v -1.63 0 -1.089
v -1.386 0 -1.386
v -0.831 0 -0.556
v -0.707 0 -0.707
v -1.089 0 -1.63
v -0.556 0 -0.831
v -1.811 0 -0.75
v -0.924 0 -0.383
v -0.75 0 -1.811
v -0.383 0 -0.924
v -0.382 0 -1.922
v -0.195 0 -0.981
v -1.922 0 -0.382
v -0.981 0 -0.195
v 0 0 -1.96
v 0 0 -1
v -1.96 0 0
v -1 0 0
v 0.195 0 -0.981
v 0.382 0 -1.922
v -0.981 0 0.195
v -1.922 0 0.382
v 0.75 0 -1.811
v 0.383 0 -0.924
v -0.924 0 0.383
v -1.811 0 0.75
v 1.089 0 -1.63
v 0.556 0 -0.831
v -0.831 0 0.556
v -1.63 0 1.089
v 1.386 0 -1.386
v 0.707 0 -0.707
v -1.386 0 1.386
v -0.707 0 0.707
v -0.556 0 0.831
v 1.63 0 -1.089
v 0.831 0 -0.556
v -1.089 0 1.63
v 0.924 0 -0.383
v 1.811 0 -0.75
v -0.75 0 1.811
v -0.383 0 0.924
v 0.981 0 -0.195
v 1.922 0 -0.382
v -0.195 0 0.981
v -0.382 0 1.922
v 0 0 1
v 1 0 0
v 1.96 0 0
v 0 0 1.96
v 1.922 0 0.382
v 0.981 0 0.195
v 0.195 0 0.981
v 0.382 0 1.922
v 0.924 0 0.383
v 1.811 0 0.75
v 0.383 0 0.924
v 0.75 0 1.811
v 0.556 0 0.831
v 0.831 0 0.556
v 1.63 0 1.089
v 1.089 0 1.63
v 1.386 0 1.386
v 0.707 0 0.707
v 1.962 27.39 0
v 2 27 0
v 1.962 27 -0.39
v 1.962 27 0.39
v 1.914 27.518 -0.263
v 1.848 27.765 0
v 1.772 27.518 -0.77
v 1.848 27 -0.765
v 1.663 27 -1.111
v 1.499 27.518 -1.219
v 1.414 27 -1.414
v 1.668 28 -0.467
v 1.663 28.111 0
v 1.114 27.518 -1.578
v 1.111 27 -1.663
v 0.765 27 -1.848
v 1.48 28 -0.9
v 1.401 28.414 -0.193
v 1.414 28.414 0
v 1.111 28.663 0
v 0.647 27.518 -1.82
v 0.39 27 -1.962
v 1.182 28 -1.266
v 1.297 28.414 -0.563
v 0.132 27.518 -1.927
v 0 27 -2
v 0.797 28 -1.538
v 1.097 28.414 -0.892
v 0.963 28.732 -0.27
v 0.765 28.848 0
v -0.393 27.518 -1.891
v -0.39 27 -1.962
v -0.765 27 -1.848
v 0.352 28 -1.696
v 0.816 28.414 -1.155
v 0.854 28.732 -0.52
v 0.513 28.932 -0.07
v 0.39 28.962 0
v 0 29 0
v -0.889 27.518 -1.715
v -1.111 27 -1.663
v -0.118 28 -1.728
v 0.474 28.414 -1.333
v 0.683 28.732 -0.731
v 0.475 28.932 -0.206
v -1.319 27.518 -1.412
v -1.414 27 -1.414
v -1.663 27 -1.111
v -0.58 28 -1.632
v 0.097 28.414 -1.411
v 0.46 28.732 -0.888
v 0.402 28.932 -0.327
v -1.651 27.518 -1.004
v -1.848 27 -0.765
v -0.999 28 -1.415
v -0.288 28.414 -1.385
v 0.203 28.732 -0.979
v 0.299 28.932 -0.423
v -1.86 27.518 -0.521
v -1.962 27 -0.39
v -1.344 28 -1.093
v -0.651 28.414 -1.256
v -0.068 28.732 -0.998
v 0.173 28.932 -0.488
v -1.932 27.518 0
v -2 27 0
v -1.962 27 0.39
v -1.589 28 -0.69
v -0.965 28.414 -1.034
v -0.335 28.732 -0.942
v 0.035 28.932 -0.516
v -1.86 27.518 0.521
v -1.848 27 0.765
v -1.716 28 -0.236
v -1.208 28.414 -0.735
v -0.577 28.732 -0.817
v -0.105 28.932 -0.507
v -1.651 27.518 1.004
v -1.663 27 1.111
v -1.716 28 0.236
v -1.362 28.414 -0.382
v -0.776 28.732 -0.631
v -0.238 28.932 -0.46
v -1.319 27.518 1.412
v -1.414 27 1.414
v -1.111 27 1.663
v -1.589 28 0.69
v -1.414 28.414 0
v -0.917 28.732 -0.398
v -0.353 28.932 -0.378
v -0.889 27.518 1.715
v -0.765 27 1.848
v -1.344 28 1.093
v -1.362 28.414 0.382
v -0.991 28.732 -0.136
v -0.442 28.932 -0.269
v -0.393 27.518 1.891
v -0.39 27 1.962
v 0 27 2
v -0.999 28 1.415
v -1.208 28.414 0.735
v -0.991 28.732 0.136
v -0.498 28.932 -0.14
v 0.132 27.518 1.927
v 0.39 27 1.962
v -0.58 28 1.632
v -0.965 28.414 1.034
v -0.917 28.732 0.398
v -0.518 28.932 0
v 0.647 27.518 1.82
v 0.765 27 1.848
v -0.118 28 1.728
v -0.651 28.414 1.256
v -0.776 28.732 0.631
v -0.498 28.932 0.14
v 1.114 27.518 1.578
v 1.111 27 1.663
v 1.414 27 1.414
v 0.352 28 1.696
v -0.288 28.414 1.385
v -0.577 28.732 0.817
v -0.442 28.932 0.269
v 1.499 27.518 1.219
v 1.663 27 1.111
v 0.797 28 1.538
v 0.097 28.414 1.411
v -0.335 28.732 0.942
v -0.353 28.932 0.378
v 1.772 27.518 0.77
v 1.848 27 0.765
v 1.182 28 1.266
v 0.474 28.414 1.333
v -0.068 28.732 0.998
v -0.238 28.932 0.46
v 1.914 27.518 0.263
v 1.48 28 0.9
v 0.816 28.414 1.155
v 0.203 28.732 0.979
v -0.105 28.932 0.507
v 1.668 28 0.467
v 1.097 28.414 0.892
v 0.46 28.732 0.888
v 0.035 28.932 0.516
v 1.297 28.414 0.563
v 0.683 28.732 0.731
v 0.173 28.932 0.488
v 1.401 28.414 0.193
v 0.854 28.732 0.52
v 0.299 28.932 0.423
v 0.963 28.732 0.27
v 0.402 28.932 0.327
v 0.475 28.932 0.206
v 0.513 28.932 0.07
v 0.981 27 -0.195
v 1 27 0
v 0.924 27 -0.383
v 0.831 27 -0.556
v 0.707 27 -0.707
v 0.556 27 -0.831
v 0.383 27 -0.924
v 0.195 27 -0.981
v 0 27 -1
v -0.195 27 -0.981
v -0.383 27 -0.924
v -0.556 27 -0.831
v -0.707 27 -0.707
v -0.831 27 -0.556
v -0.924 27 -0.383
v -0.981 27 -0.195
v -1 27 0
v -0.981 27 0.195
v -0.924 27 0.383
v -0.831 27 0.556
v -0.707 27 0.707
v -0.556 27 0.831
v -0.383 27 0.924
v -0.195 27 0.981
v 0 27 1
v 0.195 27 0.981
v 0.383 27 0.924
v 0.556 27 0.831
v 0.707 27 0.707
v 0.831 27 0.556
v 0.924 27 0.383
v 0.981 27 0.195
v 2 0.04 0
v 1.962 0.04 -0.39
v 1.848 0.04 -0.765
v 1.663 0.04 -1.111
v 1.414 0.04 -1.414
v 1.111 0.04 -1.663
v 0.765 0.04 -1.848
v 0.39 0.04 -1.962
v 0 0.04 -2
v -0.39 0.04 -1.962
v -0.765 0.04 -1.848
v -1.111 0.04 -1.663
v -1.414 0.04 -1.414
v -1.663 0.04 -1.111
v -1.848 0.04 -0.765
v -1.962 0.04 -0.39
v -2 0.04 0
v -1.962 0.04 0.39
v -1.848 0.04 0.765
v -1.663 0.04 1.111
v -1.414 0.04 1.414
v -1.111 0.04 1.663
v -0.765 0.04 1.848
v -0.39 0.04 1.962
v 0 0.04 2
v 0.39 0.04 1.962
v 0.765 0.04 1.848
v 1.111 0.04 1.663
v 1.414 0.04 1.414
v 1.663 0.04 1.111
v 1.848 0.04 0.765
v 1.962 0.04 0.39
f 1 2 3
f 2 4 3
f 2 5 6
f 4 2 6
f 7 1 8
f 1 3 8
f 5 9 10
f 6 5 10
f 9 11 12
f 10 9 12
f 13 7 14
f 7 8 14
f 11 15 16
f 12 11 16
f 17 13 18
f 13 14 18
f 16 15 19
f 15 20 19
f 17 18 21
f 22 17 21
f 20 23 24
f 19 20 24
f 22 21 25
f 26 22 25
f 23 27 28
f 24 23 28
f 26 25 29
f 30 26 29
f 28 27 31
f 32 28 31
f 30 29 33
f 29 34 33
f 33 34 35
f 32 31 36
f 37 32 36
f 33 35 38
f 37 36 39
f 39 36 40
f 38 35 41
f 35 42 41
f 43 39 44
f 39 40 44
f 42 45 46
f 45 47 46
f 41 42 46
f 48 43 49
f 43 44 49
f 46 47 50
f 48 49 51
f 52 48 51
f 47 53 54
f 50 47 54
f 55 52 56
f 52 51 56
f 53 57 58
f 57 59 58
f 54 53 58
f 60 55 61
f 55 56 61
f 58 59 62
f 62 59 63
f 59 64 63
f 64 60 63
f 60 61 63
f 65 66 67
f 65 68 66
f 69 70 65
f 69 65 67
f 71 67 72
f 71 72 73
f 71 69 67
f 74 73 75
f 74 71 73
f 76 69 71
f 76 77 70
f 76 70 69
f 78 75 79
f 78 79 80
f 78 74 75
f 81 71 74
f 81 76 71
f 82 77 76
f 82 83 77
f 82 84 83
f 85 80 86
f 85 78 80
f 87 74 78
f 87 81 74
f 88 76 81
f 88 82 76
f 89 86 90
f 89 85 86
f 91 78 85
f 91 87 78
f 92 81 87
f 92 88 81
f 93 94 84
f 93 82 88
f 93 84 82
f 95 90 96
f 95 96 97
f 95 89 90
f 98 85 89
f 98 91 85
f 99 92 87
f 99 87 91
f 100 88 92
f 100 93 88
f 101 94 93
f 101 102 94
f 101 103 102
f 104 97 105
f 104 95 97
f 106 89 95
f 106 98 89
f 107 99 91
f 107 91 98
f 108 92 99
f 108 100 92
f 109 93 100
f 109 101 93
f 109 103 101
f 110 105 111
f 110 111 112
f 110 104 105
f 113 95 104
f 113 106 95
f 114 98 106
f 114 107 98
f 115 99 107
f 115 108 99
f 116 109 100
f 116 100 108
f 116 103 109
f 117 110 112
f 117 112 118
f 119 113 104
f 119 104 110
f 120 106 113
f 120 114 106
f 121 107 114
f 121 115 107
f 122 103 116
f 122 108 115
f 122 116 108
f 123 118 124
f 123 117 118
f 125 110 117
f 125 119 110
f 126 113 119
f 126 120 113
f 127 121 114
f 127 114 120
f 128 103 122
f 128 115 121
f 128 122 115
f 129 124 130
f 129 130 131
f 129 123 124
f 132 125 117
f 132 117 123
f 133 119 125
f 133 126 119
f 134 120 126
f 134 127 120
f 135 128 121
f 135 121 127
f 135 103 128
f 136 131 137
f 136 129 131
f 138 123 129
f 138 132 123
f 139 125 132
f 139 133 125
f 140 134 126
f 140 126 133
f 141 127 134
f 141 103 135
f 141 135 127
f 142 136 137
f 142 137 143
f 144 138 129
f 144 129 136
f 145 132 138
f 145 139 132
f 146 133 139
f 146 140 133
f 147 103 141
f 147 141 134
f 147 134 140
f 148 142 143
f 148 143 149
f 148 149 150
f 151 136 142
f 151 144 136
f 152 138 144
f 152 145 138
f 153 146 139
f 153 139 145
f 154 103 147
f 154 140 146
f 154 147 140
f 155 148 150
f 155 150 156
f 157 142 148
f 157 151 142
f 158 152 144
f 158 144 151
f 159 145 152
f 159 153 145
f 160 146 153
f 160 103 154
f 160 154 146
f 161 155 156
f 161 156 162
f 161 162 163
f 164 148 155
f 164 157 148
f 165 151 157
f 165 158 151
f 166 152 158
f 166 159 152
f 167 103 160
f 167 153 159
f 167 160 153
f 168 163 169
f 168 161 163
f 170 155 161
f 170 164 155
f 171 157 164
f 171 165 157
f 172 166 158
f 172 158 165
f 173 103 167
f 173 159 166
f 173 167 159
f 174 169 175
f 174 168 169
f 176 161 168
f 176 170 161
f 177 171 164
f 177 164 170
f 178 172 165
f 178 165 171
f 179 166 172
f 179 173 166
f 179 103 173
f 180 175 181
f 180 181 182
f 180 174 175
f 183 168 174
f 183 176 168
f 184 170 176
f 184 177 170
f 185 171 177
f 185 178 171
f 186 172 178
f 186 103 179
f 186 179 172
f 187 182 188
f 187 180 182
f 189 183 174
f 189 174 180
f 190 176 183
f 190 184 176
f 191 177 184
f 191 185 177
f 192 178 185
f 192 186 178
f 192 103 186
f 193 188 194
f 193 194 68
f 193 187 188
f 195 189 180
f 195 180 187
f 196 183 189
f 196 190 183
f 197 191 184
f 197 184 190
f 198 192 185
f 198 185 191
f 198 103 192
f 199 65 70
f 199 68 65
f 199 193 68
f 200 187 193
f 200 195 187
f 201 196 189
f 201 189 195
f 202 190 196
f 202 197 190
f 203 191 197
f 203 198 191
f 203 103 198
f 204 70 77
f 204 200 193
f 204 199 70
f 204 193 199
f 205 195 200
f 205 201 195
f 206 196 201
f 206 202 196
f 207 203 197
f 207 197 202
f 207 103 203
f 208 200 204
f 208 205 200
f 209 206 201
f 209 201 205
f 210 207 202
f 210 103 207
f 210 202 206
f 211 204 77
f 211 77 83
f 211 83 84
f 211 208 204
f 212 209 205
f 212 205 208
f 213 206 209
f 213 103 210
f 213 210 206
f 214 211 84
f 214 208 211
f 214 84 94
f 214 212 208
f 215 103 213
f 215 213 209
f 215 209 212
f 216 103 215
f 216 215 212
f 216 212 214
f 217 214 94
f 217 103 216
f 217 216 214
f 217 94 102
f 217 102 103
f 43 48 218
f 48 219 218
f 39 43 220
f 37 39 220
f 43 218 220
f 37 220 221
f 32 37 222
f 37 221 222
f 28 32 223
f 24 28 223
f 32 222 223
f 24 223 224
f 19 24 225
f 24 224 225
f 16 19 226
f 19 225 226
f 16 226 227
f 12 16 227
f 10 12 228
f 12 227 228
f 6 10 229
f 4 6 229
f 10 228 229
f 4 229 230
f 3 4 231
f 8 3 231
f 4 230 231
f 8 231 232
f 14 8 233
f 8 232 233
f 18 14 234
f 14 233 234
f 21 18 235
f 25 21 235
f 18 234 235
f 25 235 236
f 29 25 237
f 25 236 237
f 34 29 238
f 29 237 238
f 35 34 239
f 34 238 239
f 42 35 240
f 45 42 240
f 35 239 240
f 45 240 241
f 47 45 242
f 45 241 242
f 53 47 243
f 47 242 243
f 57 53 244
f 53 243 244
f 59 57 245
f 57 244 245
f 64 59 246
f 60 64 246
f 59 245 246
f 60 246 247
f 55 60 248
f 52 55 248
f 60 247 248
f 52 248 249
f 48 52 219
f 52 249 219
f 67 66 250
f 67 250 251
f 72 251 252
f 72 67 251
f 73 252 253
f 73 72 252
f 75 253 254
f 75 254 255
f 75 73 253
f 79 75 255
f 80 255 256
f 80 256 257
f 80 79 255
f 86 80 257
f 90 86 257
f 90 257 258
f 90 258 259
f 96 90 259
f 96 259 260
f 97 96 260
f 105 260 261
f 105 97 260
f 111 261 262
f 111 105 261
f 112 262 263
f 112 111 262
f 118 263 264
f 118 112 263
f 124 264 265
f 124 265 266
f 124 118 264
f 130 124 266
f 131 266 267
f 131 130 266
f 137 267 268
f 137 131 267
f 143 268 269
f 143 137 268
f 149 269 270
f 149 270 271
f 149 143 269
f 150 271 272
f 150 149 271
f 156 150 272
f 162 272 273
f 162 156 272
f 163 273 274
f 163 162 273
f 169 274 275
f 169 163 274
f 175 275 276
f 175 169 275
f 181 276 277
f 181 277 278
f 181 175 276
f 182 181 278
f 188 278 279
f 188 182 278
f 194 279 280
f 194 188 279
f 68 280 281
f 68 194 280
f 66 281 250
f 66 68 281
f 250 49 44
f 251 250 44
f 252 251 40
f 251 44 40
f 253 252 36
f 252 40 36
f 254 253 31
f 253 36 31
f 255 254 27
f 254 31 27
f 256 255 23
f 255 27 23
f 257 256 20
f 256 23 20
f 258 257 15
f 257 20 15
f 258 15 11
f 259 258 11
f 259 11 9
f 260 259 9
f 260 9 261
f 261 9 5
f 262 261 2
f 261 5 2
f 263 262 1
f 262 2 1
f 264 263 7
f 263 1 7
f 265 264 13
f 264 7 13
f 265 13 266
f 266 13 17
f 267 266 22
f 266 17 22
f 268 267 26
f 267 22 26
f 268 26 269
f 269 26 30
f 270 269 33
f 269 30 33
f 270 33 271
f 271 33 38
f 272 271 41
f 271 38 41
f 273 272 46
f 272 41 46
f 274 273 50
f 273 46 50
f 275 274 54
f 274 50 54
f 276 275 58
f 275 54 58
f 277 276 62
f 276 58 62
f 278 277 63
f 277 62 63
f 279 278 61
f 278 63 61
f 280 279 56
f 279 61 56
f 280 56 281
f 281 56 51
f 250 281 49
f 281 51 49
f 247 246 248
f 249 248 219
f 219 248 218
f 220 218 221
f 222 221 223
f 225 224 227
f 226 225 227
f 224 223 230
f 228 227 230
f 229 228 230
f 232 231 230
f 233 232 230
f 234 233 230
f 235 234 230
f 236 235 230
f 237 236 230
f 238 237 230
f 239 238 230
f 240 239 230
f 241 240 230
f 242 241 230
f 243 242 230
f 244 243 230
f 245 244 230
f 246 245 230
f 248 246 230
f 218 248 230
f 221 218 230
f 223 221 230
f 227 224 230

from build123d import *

# Parameters (mm, degrees)
THICKEN1_T2   = 1
CHAMFER1_SIZE = 0.04


with BuildPart() as body_1:
    # Surface-Revolve1: a surface, the sketch's curves turned about an axis
    with BuildLine(Plane.XY, mode=Mode.PRIVATE) as surface_revolve1_1_path:
        Line((2, 0), (2, 27))
        ThreePointArc((2, 27), (1.414213562, 28.414213562), (0, 29))
    surface_revolve1_1 = Shell.revolve(surface_revolve1_1_path.wire(), 360, Axis((0, 0, 0), (0, 1, 0)))
    add(Solid.thicken(surface_revolve1_1, -THICKEN1_T2))

    # Sketch2 → Revolve1 (revolve)
    with BuildSketch(Plane.XY, mode=Mode.PRIVATE) as revolve1_sk:
        with BuildLine():
            Line((0, 29), (0, 27))
            Line((0, 27), (-2, 27))
            ThreePointArc((-2, 27), (-1.414213562, 28.414213562), (0, 29))
        make_face()
    revolve(revolve1_sk.sketch.rotate(Axis((0, 29, 0), (0, -1, 0)), 270), axis=Axis((0, 29, 0), (0, -1, 0)))

    # Chamfer1
    chamfer1_edges = [body_1.edges().sort_by_distance(p)[0] for p in [
        (-2, 0, 0),
    ]]
    chamfer(chamfer1_edges, length=CHAMFER1_SIZE)


solid = body_1.part
